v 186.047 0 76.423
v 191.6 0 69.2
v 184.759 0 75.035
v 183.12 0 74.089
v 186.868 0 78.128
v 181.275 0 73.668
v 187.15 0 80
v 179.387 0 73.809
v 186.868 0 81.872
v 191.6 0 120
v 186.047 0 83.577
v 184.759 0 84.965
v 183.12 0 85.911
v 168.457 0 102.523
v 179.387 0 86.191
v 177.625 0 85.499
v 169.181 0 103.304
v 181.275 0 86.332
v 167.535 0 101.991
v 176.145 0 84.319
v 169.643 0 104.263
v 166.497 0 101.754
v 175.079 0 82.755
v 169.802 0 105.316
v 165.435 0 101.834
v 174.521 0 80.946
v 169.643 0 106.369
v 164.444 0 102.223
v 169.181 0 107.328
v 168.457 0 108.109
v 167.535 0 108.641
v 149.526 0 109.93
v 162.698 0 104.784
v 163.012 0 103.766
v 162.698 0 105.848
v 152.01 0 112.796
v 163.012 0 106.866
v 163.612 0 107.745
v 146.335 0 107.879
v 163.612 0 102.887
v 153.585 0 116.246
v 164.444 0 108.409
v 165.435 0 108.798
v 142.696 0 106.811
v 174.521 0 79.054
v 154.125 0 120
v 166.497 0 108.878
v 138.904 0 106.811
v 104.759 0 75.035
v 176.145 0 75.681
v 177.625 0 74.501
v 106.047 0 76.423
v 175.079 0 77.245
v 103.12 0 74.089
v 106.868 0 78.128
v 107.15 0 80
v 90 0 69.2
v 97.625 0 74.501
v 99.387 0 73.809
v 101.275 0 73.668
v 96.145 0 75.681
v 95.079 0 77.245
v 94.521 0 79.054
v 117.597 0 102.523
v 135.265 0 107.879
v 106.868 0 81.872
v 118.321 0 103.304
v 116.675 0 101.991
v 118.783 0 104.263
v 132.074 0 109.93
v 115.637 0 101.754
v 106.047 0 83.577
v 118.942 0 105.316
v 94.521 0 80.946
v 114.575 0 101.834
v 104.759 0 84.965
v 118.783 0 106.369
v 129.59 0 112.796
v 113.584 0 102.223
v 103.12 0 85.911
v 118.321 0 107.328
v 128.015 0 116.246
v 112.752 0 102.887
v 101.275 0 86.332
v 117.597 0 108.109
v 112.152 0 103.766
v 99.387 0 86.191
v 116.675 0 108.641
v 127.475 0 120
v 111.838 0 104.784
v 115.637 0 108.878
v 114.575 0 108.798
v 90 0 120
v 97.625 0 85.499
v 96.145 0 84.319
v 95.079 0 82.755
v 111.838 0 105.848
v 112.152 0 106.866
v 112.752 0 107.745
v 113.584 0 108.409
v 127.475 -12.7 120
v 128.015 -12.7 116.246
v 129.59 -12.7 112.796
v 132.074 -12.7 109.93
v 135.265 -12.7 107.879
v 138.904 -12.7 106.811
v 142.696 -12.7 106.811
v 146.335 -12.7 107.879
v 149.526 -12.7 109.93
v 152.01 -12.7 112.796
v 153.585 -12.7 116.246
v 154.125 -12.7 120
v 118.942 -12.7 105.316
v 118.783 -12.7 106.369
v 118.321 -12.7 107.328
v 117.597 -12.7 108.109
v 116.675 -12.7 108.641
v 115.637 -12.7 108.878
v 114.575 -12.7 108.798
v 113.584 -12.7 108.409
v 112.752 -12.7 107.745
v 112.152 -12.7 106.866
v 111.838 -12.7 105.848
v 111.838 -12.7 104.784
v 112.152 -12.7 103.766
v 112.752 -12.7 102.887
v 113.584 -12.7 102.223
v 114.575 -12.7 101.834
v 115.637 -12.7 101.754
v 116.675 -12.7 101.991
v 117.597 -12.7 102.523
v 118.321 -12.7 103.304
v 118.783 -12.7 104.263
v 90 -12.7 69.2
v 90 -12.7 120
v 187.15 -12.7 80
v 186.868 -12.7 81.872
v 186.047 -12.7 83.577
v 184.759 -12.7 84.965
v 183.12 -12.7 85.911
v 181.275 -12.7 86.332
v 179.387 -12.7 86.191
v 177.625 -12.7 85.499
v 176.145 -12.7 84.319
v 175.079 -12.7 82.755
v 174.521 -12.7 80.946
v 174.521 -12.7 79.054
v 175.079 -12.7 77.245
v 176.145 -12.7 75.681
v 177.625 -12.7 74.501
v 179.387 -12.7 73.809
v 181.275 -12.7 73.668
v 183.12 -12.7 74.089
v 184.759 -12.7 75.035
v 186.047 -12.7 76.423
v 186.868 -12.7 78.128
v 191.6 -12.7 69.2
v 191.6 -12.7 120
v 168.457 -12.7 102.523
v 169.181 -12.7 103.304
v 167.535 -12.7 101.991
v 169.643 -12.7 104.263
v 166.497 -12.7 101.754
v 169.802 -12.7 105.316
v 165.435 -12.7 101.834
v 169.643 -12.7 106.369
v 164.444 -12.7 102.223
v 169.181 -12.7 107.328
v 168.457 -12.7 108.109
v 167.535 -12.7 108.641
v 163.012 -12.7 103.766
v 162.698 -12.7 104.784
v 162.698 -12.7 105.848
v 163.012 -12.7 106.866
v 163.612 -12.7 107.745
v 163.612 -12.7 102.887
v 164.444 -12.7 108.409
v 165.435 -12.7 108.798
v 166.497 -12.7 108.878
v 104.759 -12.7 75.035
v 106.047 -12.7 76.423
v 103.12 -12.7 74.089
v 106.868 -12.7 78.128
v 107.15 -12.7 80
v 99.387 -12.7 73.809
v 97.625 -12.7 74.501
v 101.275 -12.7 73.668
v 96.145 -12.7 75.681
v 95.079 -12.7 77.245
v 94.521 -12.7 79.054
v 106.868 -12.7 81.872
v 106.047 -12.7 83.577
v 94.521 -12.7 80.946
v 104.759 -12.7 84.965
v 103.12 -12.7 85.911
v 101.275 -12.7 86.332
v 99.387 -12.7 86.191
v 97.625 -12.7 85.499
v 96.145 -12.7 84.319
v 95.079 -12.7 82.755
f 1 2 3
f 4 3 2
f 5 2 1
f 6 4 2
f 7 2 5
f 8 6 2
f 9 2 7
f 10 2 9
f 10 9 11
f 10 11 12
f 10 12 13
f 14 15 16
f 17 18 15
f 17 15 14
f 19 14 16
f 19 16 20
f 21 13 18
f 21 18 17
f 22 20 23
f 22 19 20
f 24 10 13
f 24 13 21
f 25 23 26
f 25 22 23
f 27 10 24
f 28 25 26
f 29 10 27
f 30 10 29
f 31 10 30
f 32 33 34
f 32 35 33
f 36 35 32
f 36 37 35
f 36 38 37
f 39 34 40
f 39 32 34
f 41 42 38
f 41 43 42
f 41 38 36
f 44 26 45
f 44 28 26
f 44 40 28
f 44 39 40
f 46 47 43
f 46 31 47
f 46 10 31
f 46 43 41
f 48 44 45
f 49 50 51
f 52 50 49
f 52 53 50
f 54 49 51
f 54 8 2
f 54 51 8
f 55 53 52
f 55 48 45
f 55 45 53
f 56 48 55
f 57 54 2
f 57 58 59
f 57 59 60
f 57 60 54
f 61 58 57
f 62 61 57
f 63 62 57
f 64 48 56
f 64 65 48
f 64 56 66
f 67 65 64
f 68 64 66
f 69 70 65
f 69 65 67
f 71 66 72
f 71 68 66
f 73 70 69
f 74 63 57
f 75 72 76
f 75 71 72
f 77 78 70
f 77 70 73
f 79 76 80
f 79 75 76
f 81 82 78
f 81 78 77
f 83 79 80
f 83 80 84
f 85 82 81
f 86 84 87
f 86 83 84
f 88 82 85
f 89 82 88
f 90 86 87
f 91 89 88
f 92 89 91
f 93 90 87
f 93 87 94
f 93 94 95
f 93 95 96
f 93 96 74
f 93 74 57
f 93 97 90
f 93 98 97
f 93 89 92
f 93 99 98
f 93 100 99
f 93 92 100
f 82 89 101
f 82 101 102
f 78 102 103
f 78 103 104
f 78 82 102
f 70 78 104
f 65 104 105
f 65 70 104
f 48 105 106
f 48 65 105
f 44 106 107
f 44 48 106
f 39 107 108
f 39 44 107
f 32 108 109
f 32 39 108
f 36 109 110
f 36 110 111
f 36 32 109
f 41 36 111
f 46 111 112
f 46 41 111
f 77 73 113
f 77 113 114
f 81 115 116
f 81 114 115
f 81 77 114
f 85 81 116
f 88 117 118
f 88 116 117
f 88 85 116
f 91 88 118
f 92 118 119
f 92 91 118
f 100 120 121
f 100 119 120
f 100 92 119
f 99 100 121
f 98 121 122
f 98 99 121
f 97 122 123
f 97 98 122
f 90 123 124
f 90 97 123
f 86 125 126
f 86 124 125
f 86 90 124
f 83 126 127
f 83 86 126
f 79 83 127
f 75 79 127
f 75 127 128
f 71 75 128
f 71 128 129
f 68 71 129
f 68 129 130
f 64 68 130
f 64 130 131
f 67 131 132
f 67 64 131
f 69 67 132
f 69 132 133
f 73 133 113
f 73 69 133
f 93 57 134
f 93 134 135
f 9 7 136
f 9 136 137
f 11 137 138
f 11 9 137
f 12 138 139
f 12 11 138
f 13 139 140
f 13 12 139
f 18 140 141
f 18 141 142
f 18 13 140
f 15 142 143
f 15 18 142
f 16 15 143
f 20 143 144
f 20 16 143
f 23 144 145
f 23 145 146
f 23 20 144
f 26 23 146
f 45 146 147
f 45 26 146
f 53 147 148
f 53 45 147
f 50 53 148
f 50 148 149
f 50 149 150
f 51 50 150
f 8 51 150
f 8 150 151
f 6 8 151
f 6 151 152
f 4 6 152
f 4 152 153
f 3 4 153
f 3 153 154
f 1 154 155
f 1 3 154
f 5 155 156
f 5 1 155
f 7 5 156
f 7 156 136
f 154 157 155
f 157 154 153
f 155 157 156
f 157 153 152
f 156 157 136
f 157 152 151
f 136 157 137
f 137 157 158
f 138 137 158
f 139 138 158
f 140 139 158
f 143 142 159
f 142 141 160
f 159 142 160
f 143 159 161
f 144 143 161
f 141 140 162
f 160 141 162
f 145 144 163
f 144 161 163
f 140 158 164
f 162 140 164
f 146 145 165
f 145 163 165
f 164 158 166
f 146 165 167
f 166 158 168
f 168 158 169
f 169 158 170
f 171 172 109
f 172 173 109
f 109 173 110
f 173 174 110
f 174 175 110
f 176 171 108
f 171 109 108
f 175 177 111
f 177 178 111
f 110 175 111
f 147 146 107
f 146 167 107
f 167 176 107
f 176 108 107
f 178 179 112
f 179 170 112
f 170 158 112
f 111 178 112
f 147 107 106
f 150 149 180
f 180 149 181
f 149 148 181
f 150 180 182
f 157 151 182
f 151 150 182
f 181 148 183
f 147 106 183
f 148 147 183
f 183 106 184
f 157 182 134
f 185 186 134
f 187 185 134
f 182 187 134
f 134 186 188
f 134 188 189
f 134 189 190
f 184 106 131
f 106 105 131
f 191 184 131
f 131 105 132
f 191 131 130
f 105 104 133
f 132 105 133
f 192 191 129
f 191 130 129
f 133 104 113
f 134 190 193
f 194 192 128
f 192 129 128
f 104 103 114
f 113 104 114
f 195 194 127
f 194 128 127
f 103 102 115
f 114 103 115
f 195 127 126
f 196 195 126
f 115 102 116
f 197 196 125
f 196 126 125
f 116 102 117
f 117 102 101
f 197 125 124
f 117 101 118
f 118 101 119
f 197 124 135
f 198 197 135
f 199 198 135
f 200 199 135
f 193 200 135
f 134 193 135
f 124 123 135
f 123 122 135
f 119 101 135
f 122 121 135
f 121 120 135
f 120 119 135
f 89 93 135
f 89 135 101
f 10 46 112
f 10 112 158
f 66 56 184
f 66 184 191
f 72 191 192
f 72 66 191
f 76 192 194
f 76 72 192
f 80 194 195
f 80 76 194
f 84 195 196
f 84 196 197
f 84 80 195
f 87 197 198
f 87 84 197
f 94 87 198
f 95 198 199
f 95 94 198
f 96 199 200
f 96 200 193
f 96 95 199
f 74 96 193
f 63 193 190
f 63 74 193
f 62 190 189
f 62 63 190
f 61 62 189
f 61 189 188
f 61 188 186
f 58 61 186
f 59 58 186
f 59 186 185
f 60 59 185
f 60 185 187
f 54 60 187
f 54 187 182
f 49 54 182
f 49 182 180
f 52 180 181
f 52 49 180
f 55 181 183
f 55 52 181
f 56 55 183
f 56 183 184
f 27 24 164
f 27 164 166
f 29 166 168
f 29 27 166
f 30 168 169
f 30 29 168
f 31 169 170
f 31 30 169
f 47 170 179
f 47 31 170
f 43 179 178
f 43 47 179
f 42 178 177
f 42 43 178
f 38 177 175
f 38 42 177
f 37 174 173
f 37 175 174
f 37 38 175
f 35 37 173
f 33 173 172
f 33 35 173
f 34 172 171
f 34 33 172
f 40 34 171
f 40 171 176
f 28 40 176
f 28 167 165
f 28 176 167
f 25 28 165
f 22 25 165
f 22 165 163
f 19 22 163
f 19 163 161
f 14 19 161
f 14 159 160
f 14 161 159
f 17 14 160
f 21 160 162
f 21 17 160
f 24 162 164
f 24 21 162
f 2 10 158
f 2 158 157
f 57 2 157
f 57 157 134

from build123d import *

# Parameters (mm, degrees)
SKETCH060_R  = 3.571875
PAD060_DEPTH = 50
SKETCH059_R  = 3.571875
PAD059_DEPTH = 33.7
SKETCH058_R  = 6.35
PAD058_DEPTH = 12.7


with BuildPart() as body060:
    # Sketch060 → Pad060 (new body)
    with BuildSketch(Plane.XZ):
        Circle(SKETCH060_R)
    extrude(amount=PAD060_DEPTH)


with BuildPart() as body060_1:
    # Body060 placement: moved
    add(body060.part.moved(Location((66.23, 10, 105.316))))


with BuildPart() as body059:
    # Sketch059 → Pad059 (new body)
    with BuildSketch(Plane.XZ):
        Circle(SKETCH059_R)
    extrude(amount=PAD059_DEPTH)


with BuildPart() as body059_1:
    # Body059 placement: moved
    add(body059.part.moved(Location((15.37, 5, 105.316))))


with BuildPart() as cut050:
    # Sketch058 → Pad058 (new body)
    with BuildSketch(Plane.XZ):
        with BuildLine():
            Line((0, 59.2), (0, 110))
            Line((0, 110), (37.475, 110))
            ThreePointArc((37.475, 110), (50.8, 96.67502), (64.125, 110))
            Line((64.125, 110), (101.6, 110))
            Line((101.6, 110), (101.6, 59.2))
            Line((101.6, 59.2), (0, 59.2))
        make_face()
        with Locations((10.8, 70.00002)):
            Circle(SKETCH058_R, mode=Mode.SUBTRACT)
        with Locations((90.8, 70.00002)):
            Circle(SKETCH058_R, mode=Mode.SUBTRACT)
    extrude(amount=PAD058_DEPTH)


with BuildPart() as cut050_1:
    # Body058 placement: moved
    add(cut050.part.moved(Location((-10, 0, 10))))

    # Cut049: cut Body059
    add(body059_1.part, mode=Mode.SUBTRACT)

    # Cut050: cut Body060
    add(body060_1.part, mode=Mode.SUBTRACT)


with BuildPart() as cut050_2:
    # Cut050 placement: moved
    add(cut050_1.part.moved(Location((100, 0, 0))))


solid = cut050_2.part
